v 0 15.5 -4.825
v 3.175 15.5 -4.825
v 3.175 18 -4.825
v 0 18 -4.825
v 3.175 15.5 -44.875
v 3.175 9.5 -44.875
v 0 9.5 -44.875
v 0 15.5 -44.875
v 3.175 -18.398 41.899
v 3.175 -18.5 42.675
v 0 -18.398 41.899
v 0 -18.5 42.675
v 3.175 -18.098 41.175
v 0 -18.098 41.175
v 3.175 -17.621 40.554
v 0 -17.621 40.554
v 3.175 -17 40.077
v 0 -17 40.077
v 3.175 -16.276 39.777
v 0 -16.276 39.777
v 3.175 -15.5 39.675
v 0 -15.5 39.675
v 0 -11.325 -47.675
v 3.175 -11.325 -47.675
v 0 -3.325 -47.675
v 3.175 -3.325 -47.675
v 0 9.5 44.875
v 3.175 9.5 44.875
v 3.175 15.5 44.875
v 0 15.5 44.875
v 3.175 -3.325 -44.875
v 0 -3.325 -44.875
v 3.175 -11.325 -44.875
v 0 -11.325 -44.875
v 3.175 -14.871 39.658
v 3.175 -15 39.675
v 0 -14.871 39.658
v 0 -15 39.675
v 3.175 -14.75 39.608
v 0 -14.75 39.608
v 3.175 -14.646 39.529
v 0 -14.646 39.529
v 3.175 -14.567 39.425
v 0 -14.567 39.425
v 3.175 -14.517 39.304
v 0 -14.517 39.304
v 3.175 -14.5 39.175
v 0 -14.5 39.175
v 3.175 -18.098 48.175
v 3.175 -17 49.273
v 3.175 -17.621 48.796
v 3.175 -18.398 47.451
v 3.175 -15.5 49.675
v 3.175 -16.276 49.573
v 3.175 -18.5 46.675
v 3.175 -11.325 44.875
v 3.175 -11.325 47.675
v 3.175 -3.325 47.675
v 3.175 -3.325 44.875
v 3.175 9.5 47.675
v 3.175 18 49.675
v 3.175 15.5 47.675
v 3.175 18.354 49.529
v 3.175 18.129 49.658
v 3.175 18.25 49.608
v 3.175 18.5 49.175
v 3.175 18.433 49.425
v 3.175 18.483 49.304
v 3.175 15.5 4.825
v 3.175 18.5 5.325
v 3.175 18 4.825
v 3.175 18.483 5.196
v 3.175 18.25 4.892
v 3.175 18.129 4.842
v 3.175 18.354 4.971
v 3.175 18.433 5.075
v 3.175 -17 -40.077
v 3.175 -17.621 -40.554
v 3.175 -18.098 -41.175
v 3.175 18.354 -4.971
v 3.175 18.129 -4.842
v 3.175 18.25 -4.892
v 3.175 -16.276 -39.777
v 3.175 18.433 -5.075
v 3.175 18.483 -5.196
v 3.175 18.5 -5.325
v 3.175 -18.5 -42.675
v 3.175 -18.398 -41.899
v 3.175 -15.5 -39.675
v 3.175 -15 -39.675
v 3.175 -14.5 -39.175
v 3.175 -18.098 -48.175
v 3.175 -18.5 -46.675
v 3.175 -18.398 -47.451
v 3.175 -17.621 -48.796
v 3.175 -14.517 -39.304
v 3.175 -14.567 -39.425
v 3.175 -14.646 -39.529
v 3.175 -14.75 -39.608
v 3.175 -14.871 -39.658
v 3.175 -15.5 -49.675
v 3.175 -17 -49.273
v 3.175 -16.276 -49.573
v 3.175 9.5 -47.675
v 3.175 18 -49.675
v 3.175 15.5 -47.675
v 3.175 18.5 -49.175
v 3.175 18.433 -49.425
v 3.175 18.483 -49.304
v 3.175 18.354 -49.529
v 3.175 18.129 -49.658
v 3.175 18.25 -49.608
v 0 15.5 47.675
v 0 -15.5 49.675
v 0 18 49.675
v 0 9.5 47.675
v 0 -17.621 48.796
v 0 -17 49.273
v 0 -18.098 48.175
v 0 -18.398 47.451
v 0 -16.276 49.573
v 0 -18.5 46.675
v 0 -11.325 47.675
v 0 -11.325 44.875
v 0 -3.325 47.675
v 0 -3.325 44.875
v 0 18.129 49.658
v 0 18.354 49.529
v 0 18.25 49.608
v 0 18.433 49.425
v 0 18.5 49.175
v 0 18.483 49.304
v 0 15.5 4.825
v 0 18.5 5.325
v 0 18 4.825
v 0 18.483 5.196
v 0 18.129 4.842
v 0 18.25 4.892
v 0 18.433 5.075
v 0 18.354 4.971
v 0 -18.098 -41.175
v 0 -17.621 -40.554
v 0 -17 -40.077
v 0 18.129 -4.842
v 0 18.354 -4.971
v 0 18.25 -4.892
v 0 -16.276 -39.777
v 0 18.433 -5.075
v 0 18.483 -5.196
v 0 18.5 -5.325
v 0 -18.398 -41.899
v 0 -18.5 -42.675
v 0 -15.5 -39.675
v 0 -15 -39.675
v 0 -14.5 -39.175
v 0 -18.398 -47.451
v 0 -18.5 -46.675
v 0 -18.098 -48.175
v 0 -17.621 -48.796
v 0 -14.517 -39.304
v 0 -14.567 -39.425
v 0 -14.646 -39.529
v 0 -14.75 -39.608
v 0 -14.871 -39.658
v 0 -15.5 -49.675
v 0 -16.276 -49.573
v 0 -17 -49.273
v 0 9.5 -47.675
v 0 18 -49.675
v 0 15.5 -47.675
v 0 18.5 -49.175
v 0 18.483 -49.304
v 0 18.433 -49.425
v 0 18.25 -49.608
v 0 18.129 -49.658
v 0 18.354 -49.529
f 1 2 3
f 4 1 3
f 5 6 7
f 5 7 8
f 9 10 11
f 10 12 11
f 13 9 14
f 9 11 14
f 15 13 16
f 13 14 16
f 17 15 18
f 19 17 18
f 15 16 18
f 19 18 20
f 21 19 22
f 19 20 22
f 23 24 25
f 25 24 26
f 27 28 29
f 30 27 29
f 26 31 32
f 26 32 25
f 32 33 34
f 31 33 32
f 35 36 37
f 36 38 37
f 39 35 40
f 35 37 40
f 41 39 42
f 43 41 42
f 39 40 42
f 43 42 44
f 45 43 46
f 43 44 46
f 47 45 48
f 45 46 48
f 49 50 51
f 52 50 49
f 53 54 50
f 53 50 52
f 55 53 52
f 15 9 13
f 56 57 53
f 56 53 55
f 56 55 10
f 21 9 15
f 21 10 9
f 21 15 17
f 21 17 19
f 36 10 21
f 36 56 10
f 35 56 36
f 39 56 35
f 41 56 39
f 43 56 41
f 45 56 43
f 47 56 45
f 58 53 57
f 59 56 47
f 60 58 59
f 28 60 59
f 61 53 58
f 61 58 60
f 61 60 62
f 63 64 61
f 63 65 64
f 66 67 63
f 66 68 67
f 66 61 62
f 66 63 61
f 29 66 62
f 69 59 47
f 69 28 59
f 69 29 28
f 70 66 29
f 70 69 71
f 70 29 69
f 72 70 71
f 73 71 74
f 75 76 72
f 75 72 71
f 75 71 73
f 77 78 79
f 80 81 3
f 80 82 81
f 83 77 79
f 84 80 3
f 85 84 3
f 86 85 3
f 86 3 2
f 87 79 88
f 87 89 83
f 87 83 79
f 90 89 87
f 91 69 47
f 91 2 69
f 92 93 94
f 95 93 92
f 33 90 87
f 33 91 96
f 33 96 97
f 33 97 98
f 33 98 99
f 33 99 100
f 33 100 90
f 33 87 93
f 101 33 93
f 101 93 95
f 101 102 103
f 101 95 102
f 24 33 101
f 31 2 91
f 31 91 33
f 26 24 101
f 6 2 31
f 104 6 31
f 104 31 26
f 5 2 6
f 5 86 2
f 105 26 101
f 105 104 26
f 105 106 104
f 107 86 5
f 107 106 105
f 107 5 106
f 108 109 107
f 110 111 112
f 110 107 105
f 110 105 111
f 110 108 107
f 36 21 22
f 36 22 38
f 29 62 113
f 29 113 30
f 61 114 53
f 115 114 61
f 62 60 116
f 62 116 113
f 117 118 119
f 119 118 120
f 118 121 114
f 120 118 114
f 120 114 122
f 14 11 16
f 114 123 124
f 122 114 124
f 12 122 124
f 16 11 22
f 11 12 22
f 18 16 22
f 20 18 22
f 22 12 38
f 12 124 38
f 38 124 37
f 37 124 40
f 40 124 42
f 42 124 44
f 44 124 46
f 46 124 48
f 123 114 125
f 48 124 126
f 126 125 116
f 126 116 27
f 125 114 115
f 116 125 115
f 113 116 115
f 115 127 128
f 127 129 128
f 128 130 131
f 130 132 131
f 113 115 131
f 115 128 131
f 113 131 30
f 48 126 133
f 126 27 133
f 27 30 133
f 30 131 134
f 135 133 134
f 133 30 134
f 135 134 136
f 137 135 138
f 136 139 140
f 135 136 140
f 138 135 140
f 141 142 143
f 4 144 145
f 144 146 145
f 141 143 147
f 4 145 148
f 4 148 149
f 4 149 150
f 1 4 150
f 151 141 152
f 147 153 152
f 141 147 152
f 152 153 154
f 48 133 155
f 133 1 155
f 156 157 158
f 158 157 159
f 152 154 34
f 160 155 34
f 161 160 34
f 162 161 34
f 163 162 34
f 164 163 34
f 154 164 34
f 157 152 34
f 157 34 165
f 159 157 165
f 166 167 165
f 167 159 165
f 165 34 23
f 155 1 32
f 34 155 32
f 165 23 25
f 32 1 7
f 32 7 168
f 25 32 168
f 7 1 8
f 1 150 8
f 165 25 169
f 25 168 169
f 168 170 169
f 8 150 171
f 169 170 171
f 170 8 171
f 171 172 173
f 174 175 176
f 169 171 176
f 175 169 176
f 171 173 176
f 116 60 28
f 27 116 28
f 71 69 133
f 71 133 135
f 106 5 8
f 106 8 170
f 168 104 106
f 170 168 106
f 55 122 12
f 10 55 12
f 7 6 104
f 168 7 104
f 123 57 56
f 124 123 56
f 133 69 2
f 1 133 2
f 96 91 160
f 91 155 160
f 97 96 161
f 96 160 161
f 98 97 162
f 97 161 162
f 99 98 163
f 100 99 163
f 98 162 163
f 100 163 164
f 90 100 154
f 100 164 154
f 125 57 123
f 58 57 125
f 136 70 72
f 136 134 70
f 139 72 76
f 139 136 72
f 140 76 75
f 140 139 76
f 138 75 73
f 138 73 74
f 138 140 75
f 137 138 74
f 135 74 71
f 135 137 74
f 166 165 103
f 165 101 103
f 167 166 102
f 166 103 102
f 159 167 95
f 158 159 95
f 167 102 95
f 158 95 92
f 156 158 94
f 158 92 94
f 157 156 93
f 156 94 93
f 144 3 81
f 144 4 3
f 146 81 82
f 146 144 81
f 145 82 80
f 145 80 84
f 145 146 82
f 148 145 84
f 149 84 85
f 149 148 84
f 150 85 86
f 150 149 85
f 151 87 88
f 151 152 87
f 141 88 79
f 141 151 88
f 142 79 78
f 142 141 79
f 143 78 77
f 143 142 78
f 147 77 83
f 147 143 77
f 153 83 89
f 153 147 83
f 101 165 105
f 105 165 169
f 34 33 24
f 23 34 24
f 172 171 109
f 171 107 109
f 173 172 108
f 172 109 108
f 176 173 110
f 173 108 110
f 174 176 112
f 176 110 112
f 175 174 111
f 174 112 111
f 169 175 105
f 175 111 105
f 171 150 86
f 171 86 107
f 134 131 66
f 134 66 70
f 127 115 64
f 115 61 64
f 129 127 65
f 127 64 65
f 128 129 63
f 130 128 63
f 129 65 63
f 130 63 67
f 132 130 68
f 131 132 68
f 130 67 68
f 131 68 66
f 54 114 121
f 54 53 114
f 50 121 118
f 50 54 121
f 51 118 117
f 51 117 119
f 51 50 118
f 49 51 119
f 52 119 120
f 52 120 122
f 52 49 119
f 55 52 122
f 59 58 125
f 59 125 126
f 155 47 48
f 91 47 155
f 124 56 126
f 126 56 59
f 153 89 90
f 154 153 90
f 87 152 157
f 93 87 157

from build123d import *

# Parameters (mm, degrees)
SKETCH1_W           = 99.35
SKETCH1_H           = 37
BOSS_EXTRUDE1_DEPTH = 3.175
SKETCH2_W           = 2.8
SKETCH2_H           = 6
SKETCH2_H_2         = 8
CUT_EXTRUDE1_DEPTH  = 54.103071945
SKETCH3_W           = 79.35
SKETCH3_H           = 4
CUT_EXTRUDE2_DEPTH  = 54.103071945
FILLET1_R           = 3
FILLET2_R           = 0.5
SKETCH4_W           = 9.65
SKETCH4_H           = 3
CUT_EXTRUDE3_DEPTH  = 54.103071945
FILLET3_R           = 0.5


with BuildPart() as part:
    # Sketch1 → Boss-Extrude1 (new body)
    with BuildSketch(Plane(origin=(0, 0, 0), x_dir=(0, 0, -1), z_dir=(1, 0, 0))):
        Rectangle(SKETCH1_W, SKETCH1_H)
    extrude(amount=BOSS_EXTRUDE1_DEPTH)

    # Sketch2 → Cut-Extrude1 (cut, through all)
    with BuildSketch(Plane(origin=(3.175, 0, 0), x_dir=(0, 0, -1), z_dir=(1, 0, 0))):
        with Locations((-46.275, 12.5)):
            Rectangle(SKETCH2_W, SKETCH2_H)
        with Locations((46.275, 12.5)):
            Rectangle(SKETCH2_W, SKETCH2_H)
        with Locations((-46.275, -7.325)):
            Rectangle(SKETCH2_W, SKETCH2_H_2)
        with Locations((46.275, -7.325)):
            Rectangle(SKETCH2_W, SKETCH2_H_2)
    extrude(amount=-CUT_EXTRUDE1_DEPTH, mode=Mode.SUBTRACT)

    # Sketch3 → Cut-Extrude2 (cut, through all)
    with BuildSketch(Plane(origin=(3.175, 0, 0), x_dir=(0, 0, -1), z_dir=(1, 0, 0))):
        with Locations((0, -16.5)):
            Rectangle(SKETCH3_W, SKETCH3_H)
    extrude(amount=-CUT_EXTRUDE2_DEPTH, mode=Mode.SUBTRACT)

    # Fillet1
    fillet1_edges = [part.edges().sort_by_distance(p)[0] for p in [
        (1.5875, -18.5, -49.675),
        (1.5875, -18.5, 49.675),
        (1.5875, -18.5, 39.675),
        (1.5875, -18.5, -39.675),
    ]]
    fillet(fillet1_edges, radius=FILLET1_R)

    # Fillet2
    fillet2_edges = [part.edges().sort_by_distance(p)[0] for p in [
        (1.5875, 18.5, 49.675),
        (1.5875, 18.5, -49.675),
        (1.5875, -14.5, 39.675),
        (1.5875, -14.5, -39.675),
    ]]
    fillet(fillet2_edges, radius=FILLET2_R)

    # Sketch4 → Cut-Extrude3 (cut, through all)
    with BuildSketch(Plane(origin=(3.175, 0, 0), x_dir=(0, 0, -1), z_dir=(1, 0, 0))):
        with Locations((0, 17)):
            Rectangle(SKETCH4_W, SKETCH4_H)
    extrude(amount=-CUT_EXTRUDE3_DEPTH, mode=Mode.SUBTRACT)

    # Fillet3
    fillet3_edges = [part.edges().sort_by_distance(p)[0] for p in [
        (1.5875, 18.5, 4.825),
        (1.5875, 18.5, -4.825),
    ]]
    fillet(fillet3_edges, radius=FILLET3_R)


solid = part.part
